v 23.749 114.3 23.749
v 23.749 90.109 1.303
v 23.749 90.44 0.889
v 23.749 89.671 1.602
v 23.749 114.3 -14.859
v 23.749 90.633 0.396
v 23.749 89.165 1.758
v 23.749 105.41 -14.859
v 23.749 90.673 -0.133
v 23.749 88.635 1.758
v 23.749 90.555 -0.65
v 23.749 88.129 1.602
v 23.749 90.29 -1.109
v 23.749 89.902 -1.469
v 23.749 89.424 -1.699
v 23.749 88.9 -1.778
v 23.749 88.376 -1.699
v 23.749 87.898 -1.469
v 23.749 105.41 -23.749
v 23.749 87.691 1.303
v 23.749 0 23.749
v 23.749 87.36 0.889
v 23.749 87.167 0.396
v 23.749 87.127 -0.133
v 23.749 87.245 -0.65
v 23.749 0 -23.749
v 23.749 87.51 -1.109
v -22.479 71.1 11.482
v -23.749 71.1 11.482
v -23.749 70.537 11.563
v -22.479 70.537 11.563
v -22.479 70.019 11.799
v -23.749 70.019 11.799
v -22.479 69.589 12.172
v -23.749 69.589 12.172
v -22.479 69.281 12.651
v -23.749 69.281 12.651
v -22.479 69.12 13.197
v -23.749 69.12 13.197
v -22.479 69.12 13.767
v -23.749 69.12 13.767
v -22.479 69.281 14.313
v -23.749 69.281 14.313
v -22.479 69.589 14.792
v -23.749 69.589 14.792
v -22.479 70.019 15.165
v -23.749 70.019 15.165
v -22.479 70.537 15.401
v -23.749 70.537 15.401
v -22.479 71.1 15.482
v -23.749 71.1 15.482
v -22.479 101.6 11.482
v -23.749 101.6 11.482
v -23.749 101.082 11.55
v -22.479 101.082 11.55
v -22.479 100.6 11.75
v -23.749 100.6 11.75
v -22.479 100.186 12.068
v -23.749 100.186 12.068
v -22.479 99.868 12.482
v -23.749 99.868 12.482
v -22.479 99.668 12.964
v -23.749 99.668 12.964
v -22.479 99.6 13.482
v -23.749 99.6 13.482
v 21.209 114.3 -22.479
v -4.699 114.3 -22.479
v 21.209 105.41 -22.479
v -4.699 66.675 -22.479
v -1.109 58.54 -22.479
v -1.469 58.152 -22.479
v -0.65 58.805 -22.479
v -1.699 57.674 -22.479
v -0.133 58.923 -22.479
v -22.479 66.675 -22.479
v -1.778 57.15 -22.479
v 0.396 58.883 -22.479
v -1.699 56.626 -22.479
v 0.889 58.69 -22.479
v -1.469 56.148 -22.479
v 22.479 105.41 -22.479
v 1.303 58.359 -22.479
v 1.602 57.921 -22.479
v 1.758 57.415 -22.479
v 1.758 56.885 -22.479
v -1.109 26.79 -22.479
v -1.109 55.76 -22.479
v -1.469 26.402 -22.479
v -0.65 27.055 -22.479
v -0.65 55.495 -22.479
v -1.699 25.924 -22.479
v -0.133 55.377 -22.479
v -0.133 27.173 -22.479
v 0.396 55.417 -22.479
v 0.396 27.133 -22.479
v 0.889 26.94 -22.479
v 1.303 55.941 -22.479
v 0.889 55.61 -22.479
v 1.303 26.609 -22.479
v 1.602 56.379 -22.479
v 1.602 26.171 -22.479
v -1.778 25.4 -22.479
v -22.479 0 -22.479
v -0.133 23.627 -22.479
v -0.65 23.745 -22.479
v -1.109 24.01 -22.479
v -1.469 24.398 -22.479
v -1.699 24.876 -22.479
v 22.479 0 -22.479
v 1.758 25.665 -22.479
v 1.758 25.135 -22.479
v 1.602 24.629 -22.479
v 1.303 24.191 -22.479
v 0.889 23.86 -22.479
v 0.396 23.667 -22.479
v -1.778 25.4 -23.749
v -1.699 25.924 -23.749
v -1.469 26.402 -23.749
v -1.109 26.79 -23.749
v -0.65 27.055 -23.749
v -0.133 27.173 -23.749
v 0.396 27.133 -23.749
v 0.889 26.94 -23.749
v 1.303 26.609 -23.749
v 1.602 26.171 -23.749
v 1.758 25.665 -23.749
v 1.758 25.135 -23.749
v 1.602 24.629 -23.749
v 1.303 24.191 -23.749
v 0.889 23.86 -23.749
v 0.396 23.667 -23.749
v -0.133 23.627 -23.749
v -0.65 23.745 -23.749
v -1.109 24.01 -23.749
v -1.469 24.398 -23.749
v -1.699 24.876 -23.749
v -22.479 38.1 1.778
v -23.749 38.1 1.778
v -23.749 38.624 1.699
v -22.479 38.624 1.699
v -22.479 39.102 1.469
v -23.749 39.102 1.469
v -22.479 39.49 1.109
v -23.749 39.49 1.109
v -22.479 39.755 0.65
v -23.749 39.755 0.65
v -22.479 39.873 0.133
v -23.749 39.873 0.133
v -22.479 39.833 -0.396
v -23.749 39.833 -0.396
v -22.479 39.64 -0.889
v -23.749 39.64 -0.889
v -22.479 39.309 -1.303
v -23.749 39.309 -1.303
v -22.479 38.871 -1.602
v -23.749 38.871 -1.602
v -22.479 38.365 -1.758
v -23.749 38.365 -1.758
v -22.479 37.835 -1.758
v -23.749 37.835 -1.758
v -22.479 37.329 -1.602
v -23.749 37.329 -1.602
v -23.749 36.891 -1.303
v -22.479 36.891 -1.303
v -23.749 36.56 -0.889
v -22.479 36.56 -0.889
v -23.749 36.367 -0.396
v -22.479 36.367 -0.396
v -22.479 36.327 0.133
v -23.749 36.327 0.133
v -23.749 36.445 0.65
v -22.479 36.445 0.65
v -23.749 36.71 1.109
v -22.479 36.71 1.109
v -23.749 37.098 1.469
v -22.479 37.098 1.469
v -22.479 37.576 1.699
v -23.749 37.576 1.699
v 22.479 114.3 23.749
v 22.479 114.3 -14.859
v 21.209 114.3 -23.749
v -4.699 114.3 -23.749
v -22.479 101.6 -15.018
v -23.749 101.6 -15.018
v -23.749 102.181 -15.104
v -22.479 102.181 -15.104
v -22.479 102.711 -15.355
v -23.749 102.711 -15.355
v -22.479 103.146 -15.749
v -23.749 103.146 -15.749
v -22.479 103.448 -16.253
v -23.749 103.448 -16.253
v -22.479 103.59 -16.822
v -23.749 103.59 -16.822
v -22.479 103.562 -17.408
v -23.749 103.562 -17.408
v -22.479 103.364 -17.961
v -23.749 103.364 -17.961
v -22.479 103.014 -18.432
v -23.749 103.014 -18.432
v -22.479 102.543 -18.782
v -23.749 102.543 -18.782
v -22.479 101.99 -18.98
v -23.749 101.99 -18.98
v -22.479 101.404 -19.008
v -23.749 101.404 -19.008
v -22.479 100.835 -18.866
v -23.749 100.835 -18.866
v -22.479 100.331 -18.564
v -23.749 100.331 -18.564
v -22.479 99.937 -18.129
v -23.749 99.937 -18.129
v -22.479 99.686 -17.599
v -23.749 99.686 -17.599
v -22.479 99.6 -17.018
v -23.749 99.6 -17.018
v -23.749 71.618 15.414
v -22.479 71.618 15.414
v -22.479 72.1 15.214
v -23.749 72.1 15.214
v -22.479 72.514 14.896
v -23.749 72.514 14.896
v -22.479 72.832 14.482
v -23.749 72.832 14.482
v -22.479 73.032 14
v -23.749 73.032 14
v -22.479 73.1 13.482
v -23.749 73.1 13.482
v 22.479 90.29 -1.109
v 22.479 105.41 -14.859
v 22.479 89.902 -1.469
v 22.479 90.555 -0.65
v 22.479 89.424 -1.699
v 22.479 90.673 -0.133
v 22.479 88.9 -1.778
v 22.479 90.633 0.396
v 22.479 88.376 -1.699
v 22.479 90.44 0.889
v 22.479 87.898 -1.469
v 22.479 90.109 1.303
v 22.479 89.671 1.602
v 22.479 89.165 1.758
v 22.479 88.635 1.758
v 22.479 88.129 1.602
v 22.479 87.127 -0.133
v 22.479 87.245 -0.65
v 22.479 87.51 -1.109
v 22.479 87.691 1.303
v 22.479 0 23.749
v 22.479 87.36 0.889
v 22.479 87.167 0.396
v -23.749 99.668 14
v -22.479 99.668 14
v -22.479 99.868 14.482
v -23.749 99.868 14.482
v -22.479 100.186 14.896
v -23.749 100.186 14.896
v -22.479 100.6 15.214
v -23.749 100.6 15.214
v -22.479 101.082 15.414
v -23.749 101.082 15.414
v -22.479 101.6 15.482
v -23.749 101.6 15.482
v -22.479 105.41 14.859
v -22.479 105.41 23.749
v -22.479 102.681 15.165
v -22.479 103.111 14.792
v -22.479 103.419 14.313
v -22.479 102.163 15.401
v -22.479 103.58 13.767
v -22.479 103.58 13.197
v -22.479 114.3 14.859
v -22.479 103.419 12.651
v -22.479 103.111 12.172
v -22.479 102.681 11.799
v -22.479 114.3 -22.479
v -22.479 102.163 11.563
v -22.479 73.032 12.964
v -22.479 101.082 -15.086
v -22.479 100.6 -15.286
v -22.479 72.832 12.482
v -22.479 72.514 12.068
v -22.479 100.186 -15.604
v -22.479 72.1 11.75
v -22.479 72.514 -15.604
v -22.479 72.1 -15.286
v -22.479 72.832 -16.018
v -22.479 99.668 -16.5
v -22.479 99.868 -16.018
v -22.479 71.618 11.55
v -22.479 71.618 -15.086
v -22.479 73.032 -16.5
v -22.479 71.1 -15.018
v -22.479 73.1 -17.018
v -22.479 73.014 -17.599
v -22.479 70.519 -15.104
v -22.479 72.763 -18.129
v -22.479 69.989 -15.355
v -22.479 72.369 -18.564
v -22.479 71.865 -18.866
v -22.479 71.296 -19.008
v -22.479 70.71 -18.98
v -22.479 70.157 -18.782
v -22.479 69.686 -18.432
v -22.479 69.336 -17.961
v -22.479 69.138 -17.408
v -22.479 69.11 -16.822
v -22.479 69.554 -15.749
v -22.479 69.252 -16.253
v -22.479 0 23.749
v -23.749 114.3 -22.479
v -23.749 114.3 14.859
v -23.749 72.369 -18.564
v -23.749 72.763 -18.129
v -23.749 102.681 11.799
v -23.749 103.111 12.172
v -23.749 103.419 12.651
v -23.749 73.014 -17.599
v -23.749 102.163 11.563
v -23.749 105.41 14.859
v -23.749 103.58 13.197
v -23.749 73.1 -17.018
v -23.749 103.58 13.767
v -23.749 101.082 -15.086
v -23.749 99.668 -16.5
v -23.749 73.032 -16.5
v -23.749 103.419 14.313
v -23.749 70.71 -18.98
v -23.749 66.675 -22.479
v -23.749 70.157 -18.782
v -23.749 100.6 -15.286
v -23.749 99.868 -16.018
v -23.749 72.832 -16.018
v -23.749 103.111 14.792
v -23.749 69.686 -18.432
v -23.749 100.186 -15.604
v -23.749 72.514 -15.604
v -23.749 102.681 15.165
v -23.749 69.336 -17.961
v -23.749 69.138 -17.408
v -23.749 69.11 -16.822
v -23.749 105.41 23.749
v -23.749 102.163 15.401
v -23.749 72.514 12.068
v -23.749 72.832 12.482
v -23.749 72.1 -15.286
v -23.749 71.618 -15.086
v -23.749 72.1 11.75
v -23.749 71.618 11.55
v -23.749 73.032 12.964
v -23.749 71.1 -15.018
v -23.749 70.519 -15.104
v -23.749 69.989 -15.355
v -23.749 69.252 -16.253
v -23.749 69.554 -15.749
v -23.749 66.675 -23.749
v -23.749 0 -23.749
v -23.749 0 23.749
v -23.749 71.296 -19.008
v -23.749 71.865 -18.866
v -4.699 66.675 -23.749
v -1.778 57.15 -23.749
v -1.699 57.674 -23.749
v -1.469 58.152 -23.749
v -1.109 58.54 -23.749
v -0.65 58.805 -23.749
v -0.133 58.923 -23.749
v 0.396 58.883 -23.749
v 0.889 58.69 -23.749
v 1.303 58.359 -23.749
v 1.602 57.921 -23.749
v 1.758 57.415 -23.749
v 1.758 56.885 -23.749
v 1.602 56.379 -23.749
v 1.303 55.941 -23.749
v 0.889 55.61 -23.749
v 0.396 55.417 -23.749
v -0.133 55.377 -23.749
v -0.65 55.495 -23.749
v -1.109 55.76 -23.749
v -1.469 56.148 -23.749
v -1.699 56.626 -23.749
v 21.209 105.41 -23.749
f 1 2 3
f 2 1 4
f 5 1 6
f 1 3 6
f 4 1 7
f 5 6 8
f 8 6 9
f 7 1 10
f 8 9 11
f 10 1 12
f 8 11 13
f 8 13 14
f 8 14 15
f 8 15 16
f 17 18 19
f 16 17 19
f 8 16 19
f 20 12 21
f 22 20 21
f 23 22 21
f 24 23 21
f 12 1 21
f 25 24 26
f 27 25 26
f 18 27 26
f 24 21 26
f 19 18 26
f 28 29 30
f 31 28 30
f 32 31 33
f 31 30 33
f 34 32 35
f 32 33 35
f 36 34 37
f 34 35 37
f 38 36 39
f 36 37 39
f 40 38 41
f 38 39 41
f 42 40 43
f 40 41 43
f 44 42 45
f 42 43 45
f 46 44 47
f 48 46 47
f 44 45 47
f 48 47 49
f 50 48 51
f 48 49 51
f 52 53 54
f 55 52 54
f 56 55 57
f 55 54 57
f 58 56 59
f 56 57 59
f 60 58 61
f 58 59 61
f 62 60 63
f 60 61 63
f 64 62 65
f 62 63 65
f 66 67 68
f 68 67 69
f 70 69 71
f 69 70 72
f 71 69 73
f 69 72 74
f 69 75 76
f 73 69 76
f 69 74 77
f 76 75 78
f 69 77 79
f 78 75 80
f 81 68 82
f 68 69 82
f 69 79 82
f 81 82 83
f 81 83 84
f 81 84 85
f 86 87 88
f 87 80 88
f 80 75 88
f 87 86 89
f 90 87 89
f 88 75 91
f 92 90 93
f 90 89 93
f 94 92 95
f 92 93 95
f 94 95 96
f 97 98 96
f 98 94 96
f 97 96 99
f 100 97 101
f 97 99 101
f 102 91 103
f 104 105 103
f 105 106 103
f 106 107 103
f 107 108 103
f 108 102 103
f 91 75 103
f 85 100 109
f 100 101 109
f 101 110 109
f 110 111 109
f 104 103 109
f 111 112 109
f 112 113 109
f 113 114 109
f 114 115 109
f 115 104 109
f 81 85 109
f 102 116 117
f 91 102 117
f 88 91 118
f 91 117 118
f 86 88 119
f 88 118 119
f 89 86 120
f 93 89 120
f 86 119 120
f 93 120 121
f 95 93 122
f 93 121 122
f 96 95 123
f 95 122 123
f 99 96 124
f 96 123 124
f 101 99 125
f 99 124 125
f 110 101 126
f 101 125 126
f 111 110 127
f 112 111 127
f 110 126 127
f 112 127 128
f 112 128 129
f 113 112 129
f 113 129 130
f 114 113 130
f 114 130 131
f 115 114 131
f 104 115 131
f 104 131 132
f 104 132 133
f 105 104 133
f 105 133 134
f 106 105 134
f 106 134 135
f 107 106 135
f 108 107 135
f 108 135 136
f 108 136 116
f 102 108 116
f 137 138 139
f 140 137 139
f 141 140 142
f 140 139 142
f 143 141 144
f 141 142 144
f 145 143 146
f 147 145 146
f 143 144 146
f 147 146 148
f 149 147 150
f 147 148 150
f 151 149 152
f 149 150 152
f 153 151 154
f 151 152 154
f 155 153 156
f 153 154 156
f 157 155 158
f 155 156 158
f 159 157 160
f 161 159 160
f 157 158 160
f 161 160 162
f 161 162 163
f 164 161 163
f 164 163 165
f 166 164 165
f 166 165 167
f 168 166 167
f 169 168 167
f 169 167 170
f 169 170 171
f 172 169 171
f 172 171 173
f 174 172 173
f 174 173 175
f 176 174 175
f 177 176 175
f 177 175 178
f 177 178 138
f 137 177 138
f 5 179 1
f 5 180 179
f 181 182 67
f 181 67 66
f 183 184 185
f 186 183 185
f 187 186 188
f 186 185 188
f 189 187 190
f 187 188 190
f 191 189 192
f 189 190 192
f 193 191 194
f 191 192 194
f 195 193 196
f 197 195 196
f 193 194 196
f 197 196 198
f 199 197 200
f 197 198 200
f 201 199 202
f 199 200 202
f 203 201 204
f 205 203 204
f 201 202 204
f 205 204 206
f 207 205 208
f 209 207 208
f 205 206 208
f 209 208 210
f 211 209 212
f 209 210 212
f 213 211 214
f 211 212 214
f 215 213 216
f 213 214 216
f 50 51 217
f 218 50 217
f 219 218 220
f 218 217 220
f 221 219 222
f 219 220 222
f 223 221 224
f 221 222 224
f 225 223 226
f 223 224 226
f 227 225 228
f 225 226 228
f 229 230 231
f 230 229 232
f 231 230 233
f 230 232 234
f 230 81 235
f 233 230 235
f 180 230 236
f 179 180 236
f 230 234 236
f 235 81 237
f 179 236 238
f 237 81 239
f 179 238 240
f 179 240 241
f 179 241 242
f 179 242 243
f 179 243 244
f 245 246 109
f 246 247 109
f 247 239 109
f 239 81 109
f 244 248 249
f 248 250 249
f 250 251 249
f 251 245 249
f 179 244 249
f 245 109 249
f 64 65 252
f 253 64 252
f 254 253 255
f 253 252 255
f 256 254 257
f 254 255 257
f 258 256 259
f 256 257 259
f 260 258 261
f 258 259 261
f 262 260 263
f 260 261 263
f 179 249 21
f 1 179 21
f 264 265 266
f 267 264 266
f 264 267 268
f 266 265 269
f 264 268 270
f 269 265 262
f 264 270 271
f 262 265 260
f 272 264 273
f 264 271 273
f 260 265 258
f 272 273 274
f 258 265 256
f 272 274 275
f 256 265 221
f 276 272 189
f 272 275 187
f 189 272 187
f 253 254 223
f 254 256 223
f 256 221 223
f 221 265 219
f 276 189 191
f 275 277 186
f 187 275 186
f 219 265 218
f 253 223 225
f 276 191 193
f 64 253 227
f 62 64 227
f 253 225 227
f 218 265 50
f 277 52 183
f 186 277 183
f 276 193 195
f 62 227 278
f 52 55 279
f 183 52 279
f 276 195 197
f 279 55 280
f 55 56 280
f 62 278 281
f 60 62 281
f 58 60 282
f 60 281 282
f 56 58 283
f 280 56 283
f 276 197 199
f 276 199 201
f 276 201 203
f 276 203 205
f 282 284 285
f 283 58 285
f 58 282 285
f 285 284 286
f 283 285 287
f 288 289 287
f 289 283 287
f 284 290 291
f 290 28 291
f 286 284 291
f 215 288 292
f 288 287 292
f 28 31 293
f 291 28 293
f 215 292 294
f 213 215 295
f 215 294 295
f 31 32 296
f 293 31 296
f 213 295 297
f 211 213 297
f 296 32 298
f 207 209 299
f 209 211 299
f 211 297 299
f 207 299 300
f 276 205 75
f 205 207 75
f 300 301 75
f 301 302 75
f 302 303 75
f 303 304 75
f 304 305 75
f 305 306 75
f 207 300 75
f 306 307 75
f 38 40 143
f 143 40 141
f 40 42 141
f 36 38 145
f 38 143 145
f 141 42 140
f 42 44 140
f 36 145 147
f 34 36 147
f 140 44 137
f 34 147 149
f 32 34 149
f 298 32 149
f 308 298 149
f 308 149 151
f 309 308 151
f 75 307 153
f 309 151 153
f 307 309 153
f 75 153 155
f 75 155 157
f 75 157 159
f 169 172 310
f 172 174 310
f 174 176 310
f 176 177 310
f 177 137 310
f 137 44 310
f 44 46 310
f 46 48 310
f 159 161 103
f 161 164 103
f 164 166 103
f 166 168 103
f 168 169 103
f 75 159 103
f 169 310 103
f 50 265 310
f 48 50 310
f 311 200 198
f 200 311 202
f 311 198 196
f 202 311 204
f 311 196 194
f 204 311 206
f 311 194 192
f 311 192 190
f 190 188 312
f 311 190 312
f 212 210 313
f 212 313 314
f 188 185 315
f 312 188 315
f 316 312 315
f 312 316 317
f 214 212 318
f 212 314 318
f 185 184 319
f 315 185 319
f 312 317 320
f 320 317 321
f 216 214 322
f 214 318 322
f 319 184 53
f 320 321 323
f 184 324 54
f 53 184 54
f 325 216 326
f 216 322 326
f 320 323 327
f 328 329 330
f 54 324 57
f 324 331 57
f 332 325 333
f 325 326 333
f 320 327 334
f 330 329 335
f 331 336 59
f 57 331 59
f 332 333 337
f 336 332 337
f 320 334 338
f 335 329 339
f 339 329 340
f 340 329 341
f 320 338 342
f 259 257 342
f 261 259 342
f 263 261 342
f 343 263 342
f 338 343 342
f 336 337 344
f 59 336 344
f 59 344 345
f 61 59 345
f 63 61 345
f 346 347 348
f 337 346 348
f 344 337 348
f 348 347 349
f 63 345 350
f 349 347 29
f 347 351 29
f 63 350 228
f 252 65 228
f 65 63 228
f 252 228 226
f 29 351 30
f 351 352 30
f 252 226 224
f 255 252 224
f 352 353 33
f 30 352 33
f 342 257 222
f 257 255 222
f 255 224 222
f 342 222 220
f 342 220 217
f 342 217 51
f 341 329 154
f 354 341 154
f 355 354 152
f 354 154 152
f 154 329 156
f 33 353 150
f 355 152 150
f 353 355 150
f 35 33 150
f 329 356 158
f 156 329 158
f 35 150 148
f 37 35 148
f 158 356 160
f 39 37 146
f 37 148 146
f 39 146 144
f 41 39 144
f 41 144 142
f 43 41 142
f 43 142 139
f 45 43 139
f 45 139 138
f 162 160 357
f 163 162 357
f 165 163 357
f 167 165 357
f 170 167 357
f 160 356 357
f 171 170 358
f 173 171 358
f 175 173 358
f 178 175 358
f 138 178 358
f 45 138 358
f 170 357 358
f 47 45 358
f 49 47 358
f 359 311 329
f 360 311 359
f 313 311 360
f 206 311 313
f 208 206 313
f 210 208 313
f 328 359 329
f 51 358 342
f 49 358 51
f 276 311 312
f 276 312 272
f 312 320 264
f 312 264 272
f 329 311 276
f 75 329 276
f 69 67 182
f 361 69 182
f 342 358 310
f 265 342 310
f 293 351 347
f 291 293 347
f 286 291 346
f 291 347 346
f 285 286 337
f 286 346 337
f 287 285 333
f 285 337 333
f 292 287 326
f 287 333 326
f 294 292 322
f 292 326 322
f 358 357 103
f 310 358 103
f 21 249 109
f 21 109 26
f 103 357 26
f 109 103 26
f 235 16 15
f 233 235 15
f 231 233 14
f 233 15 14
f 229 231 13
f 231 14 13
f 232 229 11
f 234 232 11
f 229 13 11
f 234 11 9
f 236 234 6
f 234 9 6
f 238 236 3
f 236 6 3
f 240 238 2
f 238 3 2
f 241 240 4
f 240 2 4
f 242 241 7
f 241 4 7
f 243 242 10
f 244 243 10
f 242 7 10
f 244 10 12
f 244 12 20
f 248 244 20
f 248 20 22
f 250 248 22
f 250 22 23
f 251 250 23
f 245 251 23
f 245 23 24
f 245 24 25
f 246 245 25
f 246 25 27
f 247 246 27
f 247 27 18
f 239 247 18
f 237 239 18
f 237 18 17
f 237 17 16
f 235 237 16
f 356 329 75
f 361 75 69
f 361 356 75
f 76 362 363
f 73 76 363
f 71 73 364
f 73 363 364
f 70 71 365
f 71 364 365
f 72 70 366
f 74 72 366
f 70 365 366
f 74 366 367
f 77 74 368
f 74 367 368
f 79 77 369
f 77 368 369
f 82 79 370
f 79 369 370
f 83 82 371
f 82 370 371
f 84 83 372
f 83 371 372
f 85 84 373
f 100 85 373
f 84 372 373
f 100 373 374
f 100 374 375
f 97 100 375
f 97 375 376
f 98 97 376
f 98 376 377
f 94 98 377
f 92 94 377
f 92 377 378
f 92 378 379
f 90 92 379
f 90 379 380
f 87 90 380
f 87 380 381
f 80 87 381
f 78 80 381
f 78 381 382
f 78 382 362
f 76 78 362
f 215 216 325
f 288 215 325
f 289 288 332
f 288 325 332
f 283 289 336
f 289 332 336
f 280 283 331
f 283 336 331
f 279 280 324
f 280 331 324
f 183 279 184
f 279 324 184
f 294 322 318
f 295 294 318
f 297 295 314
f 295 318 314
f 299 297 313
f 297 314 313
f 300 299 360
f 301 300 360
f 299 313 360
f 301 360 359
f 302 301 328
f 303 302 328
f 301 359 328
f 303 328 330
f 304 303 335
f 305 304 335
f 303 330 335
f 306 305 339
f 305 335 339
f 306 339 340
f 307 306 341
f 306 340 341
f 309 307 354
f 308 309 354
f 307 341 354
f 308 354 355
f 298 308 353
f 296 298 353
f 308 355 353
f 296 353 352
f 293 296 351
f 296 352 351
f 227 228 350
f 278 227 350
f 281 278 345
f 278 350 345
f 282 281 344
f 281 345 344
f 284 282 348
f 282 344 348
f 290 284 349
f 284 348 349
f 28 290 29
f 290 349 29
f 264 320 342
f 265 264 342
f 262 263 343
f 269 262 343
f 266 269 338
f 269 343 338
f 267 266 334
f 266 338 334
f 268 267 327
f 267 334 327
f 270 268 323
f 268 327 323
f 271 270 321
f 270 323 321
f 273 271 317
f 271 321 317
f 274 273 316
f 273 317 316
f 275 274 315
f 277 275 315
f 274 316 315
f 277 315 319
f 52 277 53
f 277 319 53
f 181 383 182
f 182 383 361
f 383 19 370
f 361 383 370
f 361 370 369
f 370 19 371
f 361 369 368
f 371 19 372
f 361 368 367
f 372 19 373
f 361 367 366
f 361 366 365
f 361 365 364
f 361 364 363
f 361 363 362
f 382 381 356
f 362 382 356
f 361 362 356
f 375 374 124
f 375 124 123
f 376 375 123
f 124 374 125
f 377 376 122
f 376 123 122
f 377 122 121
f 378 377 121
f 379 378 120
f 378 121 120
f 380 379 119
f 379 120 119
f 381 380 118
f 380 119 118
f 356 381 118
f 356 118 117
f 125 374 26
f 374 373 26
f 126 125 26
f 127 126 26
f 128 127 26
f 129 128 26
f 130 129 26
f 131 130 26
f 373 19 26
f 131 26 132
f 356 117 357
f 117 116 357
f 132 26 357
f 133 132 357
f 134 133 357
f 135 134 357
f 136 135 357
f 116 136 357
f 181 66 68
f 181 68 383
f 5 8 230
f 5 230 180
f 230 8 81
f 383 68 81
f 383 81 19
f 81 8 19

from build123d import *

# Parameters (mm, degrees)
BOSS_EXTRUDE1_DEPTH = 114.3
SKETCH8_R           = 1.778
CUT_EXTRUDE1_DEPTH  = 5.08
SKETCH9_R           = 1.778
CUT_EXTRUDE2_DEPTH  = 5.08
SKETCH10_R          = 1.778
CUT_EXTRUDE3_DEPTH  = 5.08
SKETCH13_R          = 1.778
CUT_EXTRUDE6_DEPTH  = 5.08
CUT_EXTRUDE7_DEPTH  = 2.54
SKETCH16_W          = 19.05
SKETCH16_H          = 1.27
CUT_EXTRUDE8_DEPTH  = 47.625
SKETCH17_W          = 8.89
SKETCH17_H          = 8.89
CUT_EXTRUDE9_DEPTH  = 38.1
SKETCH18_W          = 8.89
SKETCH18_H          = 8.89
CUT_EXTRUDE10_DEPTH = 2.54


with BuildPart() as part:
    # Sketch1 → Boss-Extrude1 (new body)
    with BuildSketch(Plane(origin=(0, 0, 0), x_dir=(1, 0, 0), z_dir=(0, 1, 0))):
        Polygon((23.749, 23.749), (-23.749, 23.749), (-23.749, -23.749), (-22.479, -23.749), (-22.479, 22.479), (22.479, 22.479), (22.479, -23.749), (23.749, -23.749), align=None)
    extrude(amount=BOSS_EXTRUDE1_DEPTH)

    # Sketch8 → Cut-Extrude1 (cut)
    with BuildSketch(Plane(origin=(0, 0, -23.749), x_dir=(-1, 0, 0), z_dir=(0, 0, -1))):
        with Locations((0, 57.15)):
            Circle(SKETCH8_R)
    extrude(amount=-CUT_EXTRUDE1_DEPTH, mode=Mode.SUBTRACT)

    # Sketch9 → Cut-Extrude2 (cut)
    with BuildSketch(Plane.ZY.offset(23.749)):
        with Locations((0, 38.1)):
            Circle(SKETCH9_R)
    extrude(amount=-CUT_EXTRUDE2_DEPTH, mode=Mode.SUBTRACT)

    # Sketch10 → Cut-Extrude3 (cut)
    with BuildSketch(Plane(origin=(23.749, 0, 0), x_dir=(0, 0, -1), z_dir=(1, 0, 0))):
        with Locations((0, 88.9)):
            Circle(SKETCH10_R)
    extrude(amount=-CUT_EXTRUDE3_DEPTH, mode=Mode.SUBTRACT)

    # Sketch13 → Cut-Extrude6 (cut)
    with BuildSketch(Plane(origin=(0, 0, -23.749), x_dir=(-1, 0, 0), z_dir=(0, 0, -1))):
        with Locations((0, 25.4)):
            Circle(SKETCH13_R)
    extrude(amount=-CUT_EXTRUDE6_DEPTH, mode=Mode.SUBTRACT)

    # Sketch14 → Cut-Extrude7 (cut)
    with BuildSketch(Plane.ZY.offset(23.749)):
        with BuildLine():
            Line((-17.018, 99.6), (-17.018, 101.6))
            Line((-17.018, 101.6), (-15.018, 101.6))
            ThreePointArc((-15.018, 101.6), (-18.432213562, 103.014213562), (-17.018, 99.6))
        make_face()
        with BuildLine():
            Line((-15.018, 101.6), (-17.018, 101.6))
            Line((-17.018, 101.6), (-17.018, 99.6))
            ThreePointArc((-17.018, 99.6), (-15.603786438, 100.185786438), (-15.018, 101.6))
        make_face()
        with BuildLine():
            ThreePointArc((15.482, 101.6), (13.482, 103.6), (11.482, 101.6))
            Line((11.482, 101.6), (13.482, 101.6))
            Line((13.482, 101.6), (13.482, 99.6))
            ThreePointArc((13.482, 99.6), (14.896213562, 100.185786438), (15.482, 101.6))
        make_face()
        with BuildLine():
            Line((13.482, 101.6), (11.482, 101.6))
            ThreePointArc((11.482, 101.6), (12.067786438, 100.185786438), (13.482, 99.6))
            Line((13.482, 99.6), (13.482, 101.6))
        make_face()
        with BuildLine():
            ThreePointArc((15.482, 71.1), (14.896213562, 72.514213562), (13.482, 73.1))
            Line((13.482, 73.1), (13.482, 71.1))
            Line((13.482, 71.1), (11.482, 71.1))
            ThreePointArc((11.482, 71.1), (13.482, 69.1), (15.482, 71.1))
        make_face()
        with BuildLine():
            Line((13.482, 71.1), (13.482, 73.1))
            ThreePointArc((13.482, 73.1), (12.067786438, 72.514213562), (11.482, 71.1))
            Line((11.482, 71.1), (13.482, 71.1))
        make_face()
        with BuildLine():
            ThreePointArc((-15.018, 71.1), (-15.603786438, 72.514213562), (-17.018, 73.1))
            Line((-17.018, 73.1), (-17.018, 71.1))
            Line((-17.018, 71.1), (-15.018, 71.1))
        make_face()
        with BuildLine():
            Line((-17.018, 71.1), (-17.018, 73.1))
            ThreePointArc((-17.018, 73.1), (-18.432213562, 69.685786438), (-15.018, 71.1))
            Line((-15.018, 71.1), (-17.018, 71.1))
        make_face()
    extrude(amount=-CUT_EXTRUDE7_DEPTH, mode=Mode.SUBTRACT)

    # Sketch16 → Cut-Extrude8 (cut)
    with BuildSketch(Plane(origin=(0, 114.3, 0), x_dir=(1, 0, 0), z_dir=(0, 1, 0))):
        with Locations((-14.224, 23.114)):
            Rectangle(SKETCH16_W, SKETCH16_H)
    extrude(amount=-CUT_EXTRUDE8_DEPTH, mode=Mode.SUBTRACT)

    # Sketch17 → Cut-Extrude9 (cut)
    with BuildSketch(Plane.ZY.offset(23.749)):
        with Locations((19.304, 109.855)):
            Rectangle(SKETCH17_W, SKETCH17_H)
    extrude(amount=-CUT_EXTRUDE9_DEPTH, mode=Mode.SUBTRACT)

    # Sketch18 → Cut-Extrude10 (cut)
    with BuildSketch(Plane(origin=(23.749, 0, 0), x_dir=(0, 0, -1), z_dir=(1, 0, 0))):
        with Locations((19.304, 109.855)):
            Rectangle(SKETCH18_W, SKETCH18_H)
    extrude(amount=-CUT_EXTRUDE10_DEPTH, mode=Mode.SUBTRACT)


solid = part.part
